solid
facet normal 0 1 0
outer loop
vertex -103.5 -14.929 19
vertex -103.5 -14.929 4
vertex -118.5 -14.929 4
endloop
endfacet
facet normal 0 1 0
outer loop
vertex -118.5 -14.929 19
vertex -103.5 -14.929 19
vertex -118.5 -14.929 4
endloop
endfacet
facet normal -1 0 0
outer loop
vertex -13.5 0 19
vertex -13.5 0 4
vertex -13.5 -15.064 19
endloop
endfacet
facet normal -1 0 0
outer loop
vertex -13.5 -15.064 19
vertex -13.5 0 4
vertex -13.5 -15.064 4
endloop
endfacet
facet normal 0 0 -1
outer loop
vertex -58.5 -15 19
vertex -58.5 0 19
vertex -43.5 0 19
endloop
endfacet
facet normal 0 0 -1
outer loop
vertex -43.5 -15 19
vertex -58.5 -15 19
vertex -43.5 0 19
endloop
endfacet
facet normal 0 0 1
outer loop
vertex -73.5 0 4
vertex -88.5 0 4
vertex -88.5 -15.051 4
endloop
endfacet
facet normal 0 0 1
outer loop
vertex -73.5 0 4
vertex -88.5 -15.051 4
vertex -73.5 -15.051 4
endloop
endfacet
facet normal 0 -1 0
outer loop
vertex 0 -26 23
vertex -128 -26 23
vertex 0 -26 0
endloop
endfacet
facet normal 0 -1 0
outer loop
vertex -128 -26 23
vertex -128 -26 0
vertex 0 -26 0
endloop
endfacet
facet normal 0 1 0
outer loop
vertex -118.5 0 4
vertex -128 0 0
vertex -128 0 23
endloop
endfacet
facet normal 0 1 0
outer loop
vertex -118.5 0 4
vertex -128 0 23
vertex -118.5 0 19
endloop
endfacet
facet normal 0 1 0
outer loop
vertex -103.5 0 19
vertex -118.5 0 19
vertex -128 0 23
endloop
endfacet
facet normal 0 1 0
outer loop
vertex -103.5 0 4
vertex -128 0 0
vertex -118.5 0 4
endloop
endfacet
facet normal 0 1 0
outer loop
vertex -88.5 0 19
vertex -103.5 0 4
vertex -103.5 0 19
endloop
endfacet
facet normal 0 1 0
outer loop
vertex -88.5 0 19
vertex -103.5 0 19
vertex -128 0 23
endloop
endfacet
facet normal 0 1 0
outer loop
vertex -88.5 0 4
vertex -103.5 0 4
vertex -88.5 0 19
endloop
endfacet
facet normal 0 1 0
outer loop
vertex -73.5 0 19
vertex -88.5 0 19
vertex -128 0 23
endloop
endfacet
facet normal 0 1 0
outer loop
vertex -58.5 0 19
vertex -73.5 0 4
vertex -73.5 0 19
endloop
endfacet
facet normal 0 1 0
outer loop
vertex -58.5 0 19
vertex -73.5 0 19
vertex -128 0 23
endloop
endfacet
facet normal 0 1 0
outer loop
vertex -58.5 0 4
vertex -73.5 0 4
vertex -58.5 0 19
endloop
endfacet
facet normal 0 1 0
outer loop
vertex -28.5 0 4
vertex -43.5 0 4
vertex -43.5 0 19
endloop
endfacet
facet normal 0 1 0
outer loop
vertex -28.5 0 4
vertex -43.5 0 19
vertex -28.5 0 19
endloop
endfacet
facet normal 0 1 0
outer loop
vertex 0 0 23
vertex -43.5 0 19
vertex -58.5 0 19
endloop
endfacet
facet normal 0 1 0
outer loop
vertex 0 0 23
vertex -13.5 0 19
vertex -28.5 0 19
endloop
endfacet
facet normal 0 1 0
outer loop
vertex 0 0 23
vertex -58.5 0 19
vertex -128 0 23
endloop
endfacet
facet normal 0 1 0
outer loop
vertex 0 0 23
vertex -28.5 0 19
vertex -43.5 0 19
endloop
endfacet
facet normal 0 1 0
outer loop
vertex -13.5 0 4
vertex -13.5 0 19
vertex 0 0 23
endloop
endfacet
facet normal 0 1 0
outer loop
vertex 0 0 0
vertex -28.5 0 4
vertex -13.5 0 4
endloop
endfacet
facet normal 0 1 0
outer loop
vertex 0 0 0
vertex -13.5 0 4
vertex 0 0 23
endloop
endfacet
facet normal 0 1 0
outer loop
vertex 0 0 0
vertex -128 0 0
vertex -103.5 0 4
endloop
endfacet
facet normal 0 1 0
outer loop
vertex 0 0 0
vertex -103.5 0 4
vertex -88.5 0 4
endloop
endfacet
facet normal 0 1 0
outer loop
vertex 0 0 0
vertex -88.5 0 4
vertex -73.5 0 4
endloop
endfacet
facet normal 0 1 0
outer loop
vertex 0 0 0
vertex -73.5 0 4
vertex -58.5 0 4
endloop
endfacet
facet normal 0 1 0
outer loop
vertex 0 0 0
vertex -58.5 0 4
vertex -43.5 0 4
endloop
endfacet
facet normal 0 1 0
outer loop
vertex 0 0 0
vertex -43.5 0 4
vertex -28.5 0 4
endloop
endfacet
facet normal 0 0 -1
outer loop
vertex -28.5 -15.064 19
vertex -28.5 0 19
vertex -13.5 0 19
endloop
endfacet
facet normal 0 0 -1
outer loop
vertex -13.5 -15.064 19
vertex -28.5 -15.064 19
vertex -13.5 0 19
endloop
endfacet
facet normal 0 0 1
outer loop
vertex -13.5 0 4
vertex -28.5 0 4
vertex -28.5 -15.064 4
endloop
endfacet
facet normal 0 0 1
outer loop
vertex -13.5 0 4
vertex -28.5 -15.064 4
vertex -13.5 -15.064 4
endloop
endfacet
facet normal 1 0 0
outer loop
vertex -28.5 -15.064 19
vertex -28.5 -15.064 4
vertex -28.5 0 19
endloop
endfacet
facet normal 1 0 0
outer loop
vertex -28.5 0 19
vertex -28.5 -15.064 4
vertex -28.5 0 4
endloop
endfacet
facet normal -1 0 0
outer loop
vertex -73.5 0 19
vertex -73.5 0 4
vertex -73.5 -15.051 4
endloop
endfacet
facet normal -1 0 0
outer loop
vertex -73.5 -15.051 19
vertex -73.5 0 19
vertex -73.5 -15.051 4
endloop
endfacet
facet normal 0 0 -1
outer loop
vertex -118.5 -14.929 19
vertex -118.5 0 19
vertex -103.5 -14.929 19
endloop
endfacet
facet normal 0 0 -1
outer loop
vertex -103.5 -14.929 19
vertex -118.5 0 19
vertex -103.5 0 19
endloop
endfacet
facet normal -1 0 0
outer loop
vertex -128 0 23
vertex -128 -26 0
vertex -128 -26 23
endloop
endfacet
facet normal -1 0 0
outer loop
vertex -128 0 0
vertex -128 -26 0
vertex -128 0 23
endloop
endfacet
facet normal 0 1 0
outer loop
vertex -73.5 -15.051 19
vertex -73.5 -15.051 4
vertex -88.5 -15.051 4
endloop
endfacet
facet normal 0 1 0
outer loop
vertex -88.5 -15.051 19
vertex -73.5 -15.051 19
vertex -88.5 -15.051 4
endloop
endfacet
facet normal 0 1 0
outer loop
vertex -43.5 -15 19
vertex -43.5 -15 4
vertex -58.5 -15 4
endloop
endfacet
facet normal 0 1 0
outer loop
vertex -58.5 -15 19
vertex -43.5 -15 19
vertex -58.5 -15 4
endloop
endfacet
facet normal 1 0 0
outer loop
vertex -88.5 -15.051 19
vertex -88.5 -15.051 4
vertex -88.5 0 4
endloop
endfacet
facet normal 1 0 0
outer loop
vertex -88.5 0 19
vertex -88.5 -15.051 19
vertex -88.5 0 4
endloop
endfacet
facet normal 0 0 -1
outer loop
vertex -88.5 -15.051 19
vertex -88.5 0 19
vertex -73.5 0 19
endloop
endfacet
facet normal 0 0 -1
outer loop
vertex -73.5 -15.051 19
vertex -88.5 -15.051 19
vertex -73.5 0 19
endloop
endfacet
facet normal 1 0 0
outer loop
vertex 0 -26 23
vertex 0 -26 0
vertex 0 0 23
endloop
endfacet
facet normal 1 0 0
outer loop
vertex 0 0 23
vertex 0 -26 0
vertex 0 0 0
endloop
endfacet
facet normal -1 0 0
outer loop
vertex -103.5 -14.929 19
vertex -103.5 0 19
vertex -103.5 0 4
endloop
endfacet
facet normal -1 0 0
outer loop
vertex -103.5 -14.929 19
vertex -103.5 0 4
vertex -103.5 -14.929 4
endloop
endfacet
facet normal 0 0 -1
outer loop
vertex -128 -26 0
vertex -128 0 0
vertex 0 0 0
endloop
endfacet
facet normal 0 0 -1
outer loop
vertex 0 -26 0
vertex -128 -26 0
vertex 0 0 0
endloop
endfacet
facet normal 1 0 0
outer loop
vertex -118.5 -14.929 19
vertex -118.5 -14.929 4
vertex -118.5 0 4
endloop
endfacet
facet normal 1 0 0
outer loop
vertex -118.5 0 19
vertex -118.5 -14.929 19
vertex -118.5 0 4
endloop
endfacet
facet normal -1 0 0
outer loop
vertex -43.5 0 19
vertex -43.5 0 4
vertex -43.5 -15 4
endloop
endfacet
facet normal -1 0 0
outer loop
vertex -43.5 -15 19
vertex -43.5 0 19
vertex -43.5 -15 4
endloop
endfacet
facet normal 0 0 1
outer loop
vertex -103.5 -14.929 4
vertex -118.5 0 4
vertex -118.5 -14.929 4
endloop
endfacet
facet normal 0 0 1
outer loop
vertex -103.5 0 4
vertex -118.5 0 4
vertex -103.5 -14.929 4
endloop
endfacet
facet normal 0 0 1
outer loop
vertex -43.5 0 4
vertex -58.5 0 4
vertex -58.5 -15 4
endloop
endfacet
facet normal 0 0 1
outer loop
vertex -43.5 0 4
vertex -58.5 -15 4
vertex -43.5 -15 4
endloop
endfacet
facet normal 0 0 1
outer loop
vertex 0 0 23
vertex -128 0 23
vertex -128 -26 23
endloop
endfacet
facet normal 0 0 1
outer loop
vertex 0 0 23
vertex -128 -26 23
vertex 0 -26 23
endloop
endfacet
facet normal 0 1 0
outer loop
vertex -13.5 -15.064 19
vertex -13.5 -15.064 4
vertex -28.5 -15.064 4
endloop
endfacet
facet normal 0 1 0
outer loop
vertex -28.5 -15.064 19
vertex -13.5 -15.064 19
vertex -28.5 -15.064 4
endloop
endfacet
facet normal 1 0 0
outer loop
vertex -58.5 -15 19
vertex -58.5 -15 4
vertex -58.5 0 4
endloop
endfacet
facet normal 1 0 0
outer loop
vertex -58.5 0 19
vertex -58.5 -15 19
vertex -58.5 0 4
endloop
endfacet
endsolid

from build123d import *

# Parameters (mm, degrees)
F0_W     = 128
F0_H     = 26
F1_DEPTH = 4
F3_DEPTH = 15
F4_W     = 128
F4_H     = 26
F5_DEPTH = 4


# Not quite as in the source:
# - a feature names something its author has since deleted; it is built from what else it names


with BuildPart() as f1:
    # F0 (on Top) → F1 (new body)
    with BuildSketch(Plane.XY):
        with Locations((-64, -13)):
            Rectangle(F0_W, F0_H)
    extrude(amount=F1_DEPTH)

    # F2 (on face) → F3 (join)
    with BuildSketch(Plane.XY.offset(4)):
        Polygon((-88.4999999069, 0), (-103.4999999069, 0), (-103.4999999069, -14.9287388836), (-118.4999999069, -14.9287388836), (-118.4999999069, 0), (-128, 0), (-128, -26), (0, -26), (0, 0), (-13.5, 0), (-13.5, -15.0637076219), (-28.5, -15.0637076219), (-28.5, 0), (-43.4999999069, 0), (-43.4999999069, -15), (-58.4999999069, -15), (-58.4999999069, 0), (-73.4999999069, 0), (-73.4999999069, -15.0510713975), (-88.4999999069, -15.0510713975), align=None)
    extrude(amount=F3_DEPTH)

    # F4 (on face) → F5 (join)
    with BuildSketch(Plane.XY.offset(19)):
        with Locations((-64, -13)):
            Rectangle(F4_W, F4_H)
    extrude(amount=F5_DEPTH)


solid = f1.part
